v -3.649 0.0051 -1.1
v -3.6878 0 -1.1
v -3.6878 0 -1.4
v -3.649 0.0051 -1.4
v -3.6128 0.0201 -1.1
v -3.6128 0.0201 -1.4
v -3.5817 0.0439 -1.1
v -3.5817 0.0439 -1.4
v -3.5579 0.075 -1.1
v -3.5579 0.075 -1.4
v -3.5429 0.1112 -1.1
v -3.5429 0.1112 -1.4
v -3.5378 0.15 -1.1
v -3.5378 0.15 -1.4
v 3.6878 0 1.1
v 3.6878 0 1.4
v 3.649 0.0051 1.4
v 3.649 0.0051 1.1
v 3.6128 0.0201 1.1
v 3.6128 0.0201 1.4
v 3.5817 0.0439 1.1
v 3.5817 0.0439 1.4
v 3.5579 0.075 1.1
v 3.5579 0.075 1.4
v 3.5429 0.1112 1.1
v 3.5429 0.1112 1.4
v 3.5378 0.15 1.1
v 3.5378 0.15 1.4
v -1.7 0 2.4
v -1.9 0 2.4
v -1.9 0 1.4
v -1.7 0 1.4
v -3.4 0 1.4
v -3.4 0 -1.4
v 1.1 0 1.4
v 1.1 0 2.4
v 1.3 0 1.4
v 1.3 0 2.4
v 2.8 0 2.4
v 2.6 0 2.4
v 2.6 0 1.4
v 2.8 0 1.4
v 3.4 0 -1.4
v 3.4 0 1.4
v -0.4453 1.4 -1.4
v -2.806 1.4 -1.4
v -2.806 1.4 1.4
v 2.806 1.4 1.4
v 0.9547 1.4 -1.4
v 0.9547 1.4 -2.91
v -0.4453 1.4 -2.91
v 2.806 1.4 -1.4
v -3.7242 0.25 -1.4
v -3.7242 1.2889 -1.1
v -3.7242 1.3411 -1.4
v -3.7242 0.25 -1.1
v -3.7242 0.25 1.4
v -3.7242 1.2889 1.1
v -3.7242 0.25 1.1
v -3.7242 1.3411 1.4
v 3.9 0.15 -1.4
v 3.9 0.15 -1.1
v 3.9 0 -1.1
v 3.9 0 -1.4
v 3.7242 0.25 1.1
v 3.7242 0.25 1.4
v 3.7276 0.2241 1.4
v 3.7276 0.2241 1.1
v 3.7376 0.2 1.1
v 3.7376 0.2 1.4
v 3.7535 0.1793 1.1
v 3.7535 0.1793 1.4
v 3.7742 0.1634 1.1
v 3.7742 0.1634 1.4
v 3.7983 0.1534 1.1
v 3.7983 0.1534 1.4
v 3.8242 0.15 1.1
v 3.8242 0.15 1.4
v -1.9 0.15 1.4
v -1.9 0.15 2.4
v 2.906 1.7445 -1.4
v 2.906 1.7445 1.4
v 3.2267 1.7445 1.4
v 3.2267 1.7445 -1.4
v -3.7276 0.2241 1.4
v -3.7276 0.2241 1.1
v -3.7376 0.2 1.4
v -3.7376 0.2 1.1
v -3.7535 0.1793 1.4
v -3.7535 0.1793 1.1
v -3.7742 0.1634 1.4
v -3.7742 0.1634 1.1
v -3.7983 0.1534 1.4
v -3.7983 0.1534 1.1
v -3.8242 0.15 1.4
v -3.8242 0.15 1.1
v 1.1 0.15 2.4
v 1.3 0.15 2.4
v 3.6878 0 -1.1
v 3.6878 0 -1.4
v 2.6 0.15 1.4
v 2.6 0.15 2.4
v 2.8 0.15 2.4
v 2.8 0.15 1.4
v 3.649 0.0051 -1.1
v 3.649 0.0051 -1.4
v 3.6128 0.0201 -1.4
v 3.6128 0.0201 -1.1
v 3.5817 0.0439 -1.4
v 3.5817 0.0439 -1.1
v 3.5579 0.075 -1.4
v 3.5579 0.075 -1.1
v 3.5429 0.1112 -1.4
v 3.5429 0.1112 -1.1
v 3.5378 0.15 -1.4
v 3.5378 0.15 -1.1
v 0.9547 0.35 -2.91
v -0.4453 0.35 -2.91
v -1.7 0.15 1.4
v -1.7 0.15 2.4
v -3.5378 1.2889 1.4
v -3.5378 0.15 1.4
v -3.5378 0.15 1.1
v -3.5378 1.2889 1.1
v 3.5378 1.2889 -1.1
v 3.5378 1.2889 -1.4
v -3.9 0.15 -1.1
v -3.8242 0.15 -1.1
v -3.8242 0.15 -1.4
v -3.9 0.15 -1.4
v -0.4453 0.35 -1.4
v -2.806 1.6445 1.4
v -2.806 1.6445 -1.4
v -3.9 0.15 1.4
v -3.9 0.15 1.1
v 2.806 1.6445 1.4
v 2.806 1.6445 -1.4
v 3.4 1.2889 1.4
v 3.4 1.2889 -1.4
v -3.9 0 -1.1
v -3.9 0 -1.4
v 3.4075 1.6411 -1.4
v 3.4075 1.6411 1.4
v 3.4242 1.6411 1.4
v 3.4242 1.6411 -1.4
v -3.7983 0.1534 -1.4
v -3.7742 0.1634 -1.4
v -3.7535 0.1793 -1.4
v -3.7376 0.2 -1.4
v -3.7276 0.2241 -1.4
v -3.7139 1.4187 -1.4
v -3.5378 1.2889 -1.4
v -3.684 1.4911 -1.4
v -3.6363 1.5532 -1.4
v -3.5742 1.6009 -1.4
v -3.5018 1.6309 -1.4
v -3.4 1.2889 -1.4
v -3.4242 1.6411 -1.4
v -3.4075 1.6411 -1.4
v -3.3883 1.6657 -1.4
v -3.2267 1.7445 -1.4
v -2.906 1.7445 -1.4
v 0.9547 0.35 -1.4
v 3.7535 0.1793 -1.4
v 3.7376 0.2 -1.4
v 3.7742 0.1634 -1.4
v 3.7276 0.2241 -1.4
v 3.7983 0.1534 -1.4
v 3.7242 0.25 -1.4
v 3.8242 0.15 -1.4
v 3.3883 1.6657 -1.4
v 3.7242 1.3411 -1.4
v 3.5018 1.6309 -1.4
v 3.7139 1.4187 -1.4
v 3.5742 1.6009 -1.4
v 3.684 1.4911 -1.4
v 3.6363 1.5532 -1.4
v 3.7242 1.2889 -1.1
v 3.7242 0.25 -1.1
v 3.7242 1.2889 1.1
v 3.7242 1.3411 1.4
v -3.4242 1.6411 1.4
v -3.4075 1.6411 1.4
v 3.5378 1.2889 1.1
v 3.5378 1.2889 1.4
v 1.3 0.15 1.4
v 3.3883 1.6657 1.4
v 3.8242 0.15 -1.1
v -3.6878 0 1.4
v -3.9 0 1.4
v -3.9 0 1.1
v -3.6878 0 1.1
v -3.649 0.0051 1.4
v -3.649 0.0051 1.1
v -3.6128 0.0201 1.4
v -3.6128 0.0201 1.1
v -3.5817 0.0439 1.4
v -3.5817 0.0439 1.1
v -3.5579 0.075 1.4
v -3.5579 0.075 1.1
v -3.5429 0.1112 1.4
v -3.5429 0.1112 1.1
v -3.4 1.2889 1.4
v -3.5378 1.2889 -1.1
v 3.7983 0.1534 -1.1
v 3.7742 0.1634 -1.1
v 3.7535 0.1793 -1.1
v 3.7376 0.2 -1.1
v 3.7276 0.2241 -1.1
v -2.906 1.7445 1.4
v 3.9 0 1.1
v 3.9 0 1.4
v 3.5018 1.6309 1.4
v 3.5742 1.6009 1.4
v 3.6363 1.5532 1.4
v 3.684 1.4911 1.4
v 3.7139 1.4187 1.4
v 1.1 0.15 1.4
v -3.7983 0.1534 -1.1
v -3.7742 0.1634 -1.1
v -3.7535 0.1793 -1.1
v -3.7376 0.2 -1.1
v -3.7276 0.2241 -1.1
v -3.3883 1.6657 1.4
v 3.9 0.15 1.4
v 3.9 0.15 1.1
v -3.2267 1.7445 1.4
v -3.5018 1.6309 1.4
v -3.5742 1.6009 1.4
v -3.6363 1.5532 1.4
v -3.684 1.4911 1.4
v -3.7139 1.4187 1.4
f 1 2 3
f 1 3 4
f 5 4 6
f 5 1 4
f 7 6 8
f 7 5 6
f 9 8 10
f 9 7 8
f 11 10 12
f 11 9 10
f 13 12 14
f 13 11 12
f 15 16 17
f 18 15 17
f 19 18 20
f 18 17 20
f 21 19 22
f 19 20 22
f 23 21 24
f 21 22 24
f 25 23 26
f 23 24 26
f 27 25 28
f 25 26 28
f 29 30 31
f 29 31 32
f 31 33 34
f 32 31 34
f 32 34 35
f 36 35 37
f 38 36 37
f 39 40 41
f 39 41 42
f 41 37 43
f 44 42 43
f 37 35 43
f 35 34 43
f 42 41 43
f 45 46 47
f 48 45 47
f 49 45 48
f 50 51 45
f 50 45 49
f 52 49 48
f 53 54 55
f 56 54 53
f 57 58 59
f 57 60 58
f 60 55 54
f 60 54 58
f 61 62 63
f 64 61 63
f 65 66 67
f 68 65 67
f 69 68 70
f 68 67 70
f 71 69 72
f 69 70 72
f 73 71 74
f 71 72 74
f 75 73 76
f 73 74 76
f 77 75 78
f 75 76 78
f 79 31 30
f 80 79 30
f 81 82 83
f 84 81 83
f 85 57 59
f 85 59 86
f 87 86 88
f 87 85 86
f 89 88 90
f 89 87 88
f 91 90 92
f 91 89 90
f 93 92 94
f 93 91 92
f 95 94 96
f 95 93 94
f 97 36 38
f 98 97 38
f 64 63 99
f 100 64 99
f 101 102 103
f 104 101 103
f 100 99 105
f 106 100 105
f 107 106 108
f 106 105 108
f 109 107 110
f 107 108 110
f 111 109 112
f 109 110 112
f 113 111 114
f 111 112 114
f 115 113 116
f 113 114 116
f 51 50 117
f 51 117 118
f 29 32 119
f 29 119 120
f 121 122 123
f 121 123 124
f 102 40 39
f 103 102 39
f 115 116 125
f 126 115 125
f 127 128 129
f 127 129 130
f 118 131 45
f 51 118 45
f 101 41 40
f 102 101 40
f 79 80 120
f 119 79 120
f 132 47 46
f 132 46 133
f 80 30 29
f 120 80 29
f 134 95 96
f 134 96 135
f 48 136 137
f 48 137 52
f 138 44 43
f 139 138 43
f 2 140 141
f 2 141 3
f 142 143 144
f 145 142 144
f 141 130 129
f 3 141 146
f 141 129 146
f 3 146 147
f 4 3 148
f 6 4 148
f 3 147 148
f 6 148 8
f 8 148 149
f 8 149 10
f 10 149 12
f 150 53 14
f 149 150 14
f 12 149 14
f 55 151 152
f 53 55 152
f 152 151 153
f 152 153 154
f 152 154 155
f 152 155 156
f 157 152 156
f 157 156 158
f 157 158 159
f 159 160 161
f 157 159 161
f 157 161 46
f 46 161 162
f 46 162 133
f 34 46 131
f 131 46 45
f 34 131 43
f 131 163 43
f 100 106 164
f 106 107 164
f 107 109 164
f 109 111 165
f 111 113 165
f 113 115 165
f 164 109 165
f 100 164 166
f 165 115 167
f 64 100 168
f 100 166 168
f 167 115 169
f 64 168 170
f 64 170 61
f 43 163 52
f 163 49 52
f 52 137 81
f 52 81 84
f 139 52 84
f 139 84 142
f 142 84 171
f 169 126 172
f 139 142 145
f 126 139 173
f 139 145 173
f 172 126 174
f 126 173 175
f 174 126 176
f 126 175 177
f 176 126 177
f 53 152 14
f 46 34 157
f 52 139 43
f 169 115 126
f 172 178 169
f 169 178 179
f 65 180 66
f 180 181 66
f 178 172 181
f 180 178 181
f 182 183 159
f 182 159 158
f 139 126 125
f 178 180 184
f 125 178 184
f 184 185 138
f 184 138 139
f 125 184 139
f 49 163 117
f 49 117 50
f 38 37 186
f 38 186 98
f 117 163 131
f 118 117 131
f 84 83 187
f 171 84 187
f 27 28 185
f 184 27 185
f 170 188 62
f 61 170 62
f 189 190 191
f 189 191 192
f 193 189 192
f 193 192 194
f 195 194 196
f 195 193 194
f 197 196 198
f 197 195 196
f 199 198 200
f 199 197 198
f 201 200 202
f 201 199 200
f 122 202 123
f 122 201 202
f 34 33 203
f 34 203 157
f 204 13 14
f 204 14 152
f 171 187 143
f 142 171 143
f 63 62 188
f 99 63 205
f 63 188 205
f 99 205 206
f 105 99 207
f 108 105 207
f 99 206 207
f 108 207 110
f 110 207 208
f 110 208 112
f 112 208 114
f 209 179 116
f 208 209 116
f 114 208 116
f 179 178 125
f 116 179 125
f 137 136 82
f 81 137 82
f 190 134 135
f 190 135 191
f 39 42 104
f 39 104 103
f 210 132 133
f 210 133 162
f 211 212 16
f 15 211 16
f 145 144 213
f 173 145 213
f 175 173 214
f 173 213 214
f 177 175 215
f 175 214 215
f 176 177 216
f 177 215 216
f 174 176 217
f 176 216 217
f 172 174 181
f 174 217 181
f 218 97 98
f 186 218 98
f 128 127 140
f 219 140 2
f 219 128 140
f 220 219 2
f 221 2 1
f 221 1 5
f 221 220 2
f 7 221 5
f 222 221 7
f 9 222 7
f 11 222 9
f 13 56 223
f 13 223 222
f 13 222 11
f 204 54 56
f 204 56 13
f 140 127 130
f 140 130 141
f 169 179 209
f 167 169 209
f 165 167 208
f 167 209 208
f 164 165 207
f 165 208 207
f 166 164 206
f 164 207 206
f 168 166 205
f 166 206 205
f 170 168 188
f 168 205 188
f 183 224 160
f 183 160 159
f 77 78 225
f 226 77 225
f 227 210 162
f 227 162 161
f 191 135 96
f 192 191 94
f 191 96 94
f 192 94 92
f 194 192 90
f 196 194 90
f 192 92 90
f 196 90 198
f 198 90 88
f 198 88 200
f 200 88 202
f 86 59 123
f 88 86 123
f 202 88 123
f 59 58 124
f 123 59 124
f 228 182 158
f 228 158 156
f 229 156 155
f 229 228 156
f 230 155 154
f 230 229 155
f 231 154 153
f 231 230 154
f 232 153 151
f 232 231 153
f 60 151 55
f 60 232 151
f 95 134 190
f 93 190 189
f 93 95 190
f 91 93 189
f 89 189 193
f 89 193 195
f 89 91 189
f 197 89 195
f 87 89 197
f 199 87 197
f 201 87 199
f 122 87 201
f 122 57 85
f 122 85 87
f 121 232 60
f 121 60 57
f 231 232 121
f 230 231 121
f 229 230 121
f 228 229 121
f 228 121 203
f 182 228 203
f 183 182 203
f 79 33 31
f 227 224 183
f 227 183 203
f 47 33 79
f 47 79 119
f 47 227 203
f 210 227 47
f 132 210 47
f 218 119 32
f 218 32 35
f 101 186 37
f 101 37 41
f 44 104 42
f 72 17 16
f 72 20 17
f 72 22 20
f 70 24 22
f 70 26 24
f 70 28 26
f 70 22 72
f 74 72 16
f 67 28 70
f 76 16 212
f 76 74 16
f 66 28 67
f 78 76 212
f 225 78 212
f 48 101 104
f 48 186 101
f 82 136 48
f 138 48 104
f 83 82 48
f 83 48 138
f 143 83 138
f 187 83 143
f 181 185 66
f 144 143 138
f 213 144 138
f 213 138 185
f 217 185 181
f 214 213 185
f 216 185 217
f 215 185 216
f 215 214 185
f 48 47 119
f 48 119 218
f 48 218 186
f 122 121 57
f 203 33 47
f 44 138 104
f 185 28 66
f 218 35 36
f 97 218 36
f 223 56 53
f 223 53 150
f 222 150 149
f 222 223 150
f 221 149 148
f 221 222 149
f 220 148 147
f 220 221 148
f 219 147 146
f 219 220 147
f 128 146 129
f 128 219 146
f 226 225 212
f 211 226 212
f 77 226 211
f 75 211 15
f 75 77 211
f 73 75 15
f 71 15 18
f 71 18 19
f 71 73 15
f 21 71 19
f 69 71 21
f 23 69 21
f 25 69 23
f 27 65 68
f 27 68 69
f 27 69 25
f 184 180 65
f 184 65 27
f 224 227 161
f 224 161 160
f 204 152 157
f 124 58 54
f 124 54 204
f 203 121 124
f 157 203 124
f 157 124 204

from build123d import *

# Parameters (mm, degrees)
SKETCH1_W             = 6.8
SKETCH1_H             = 2.8
BOSS_EXTRUDE1_DEPTH   = 1.4
BOSS_EXTRUDE2_DEPTH   = 2.8
BOSS_EXTRUDE2_2_DEPTH = 2.8
BOSS_EXTRUDE3_DEPTH   = 2.8
CUT_EXTRUDE1_DEPTH    = 1.1
SKETCH8_W             = 0.2
SKETCH8_H             = 1
BOSS_EXTRUDE4_DEPTH   = 0.15
SKETCH9_W             = 1.4
SKETCH9_H             = 1.05
BOSS_EXTRUDE5_DEPTH   = 1.51


with BuildPart() as part:
    # Sketch1 → Boss-Extrude1 (new body)
    with BuildSketch(Plane(origin=(0, 0, 0), x_dir=(1, 0, 0), z_dir=(0, 1, 0))):
        Rectangle(SKETCH1_W, SKETCH1_H)
    extrude(amount=BOSS_EXTRUDE1_DEPTH)



with BuildPart() as body_2:
    # Sketch3 → Boss-Extrude2 (new body)
    with BuildSketch(Plane.XY.offset(1.4)):
        with BuildLine():
            Line((-3.9, 0), (-3.687815007, 0))
            ThreePointArc((-3.687815007, 0), (-3.58174899, 0.043933983), (-3.537815007, 0.15))
            Line((-3.537815007, 0.15), (-3.537815007, 1.44554352))
            Line((-3.537815007, 1.44554352), (-2.932940076, 1.44554352))
            Line((-2.932940076, 1.44554352), (-2.932940076, 1.641087041))
            Line((-2.932940076, 1.641087041), (-3.424164264, 1.641087041))
            ThreePointArc((-3.424164264, 1.641087041), (-3.636296298, 1.553219075), (-3.724164264, 1.341087041))
            Line((-3.724164264, 1.341087041), (-3.724164264, 0.25))
            ThreePointArc((-3.724164264, 0.25), (-3.753453586, 0.179289322), (-3.824164264, 0.15))
            Line((-3.824164264, 0.15), (-3.9, 0.15))
            Line((-3.9, 0.15), (-3.9, 0))
        make_face()
    extrude(amount=-BOSS_EXTRUDE2_DEPTH)


with BuildPart() as body_3:
    # Sketch3 → Boss-Extrude2 2 (new body)
    with BuildSketch(Plane.XY.offset(1.4)):
        with BuildLine():
            Line((3.824164264, 0.15), (3.9, 0.15))
            Line((3.9, 0.15), (3.9, 0))
            Line((3.9, 0), (3.687815007, 0))
            ThreePointArc((3.687815007, 0), (3.58174899, 0.043933983), (3.537815007, 0.15))
            Line((3.537815007, 0.15), (3.537815007, 1.44554352))
            Line((3.537815007, 1.44554352), (2.932940076, 1.44554352))
            Line((2.932940076, 1.44554352), (2.932940076, 1.641087041))
            Line((2.932940076, 1.641087041), (3.424164264, 1.641087041))
            ThreePointArc((3.424164264, 1.641087041), (3.636296298, 1.553219075), (3.724164264, 1.341087041))
            Line((3.724164264, 1.341087041), (3.724164264, 0.25))
            ThreePointArc((3.724164264, 0.25), (3.753453586, 0.179289322), (3.824164264, 0.15))
        make_face()
    extrude(amount=-BOSS_EXTRUDE2_2_DEPTH)


with BuildPart() as part_1:
    add(part.part)

    add(body_2.part)  # Boss-Extrude3 merges body 2

    add(body_3.part)  # Boss-Extrude3 merges body 3
    # Sketch4 → Boss-Extrude3 (add)
    with BuildSketch(Plane.XY.offset(1.4)):
        Polygon((-2.805997344, 1.4), (-2.805997344, 1.644514916), (-2.905997344, 1.744514916), (-3.226717158, 1.744514916), (-3.38829441, 1.665722517), (-3.621220366, 1.367677477), (-3.582797618, 1.288885079), (-2.805997344, 1.288885079), align=None)
        Polygon((3.582797618, 1.288885079), (2.805997344, 1.288885079), (2.805997344, 1.4), (2.805997344, 1.644514916), (2.905997344, 1.744514916), (3.226717158, 1.744514916), (3.38829441, 1.665722517), (3.621220366, 1.367677477), align=None)
    extrude(amount=-BOSS_EXTRUDE3_DEPTH)

    # Sketch6 → Cut-Extrude1 (cut, symmetric)
    with BuildSketch(Plane.XY):
        with BuildLine():
            Line((-3.537815007, 1.288885079), (-3.724164264, 1.288885079))
            Line((-3.724164264, 1.288885079), (-3.724164264, 0.25))
            ThreePointArc((-3.724164264, 0.25), (-3.753453586, 0.179289322), (-3.824164264, 0.15))
            Line((-3.824164264, 0.15), (-3.9, 0.15))
            Line((-3.9, 0.15), (-3.9, 0))
            Line((-3.9, 0), (-3.687815007, 0))
            ThreePointArc((-3.687815007, 0), (-3.58174899, 0.043933983), (-3.537815007, 0.15))
            Line((-3.537815007, 0.15), (-3.537815007, 1.288885079))
        make_face()
        with BuildLine():
            Line((3.537815007, 1.288885079), (3.724164264, 1.288885079))
            Line((3.724164264, 1.288885079), (3.724164264, 0.25))
            ThreePointArc((3.724164264, 0.25), (3.753453586, 0.179289322), (3.824164264, 0.15))
            Line((3.824164264, 0.15), (3.9, 0.15))
            Line((3.9, 0.15), (3.9, 0))
            Line((3.9, 0), (3.687815007, 0))
            ThreePointArc((3.687815007, 0), (3.58174899, 0.043933983), (3.537815007, 0.15))
            Line((3.537815007, 0.15), (3.537815007, 1.288885079))
        make_face()
    extrude(amount=CUT_EXTRUDE1_DEPTH, both=True, mode=Mode.SUBTRACT)

    # Sketch8 → Boss-Extrude4 (add)
    with BuildSketch(Plane.XZ):
        with Locations((-1.8, 1.9)):
            Rectangle(SKETCH8_W, SKETCH8_H)
        with Locations((1.2, 1.9)):
            Rectangle(SKETCH8_W, SKETCH8_H)
        with Locations((2.7, 1.9)):
            Rectangle(SKETCH8_W, SKETCH8_H)
    extrude(amount=-BOSS_EXTRUDE4_DEPTH)

    # Sketch9 → Boss-Extrude5 (add)
    with BuildSketch(Plane(origin=(0, 0, -1.4), x_dir=(-1, 0, 0), z_dir=(0, 0, -1))):
        with Locations((-0.254692735, 0.875)):
            Rectangle(SKETCH9_W, SKETCH9_H)
    extrude(amount=BOSS_EXTRUDE5_DEPTH)


solid = part_1.part
